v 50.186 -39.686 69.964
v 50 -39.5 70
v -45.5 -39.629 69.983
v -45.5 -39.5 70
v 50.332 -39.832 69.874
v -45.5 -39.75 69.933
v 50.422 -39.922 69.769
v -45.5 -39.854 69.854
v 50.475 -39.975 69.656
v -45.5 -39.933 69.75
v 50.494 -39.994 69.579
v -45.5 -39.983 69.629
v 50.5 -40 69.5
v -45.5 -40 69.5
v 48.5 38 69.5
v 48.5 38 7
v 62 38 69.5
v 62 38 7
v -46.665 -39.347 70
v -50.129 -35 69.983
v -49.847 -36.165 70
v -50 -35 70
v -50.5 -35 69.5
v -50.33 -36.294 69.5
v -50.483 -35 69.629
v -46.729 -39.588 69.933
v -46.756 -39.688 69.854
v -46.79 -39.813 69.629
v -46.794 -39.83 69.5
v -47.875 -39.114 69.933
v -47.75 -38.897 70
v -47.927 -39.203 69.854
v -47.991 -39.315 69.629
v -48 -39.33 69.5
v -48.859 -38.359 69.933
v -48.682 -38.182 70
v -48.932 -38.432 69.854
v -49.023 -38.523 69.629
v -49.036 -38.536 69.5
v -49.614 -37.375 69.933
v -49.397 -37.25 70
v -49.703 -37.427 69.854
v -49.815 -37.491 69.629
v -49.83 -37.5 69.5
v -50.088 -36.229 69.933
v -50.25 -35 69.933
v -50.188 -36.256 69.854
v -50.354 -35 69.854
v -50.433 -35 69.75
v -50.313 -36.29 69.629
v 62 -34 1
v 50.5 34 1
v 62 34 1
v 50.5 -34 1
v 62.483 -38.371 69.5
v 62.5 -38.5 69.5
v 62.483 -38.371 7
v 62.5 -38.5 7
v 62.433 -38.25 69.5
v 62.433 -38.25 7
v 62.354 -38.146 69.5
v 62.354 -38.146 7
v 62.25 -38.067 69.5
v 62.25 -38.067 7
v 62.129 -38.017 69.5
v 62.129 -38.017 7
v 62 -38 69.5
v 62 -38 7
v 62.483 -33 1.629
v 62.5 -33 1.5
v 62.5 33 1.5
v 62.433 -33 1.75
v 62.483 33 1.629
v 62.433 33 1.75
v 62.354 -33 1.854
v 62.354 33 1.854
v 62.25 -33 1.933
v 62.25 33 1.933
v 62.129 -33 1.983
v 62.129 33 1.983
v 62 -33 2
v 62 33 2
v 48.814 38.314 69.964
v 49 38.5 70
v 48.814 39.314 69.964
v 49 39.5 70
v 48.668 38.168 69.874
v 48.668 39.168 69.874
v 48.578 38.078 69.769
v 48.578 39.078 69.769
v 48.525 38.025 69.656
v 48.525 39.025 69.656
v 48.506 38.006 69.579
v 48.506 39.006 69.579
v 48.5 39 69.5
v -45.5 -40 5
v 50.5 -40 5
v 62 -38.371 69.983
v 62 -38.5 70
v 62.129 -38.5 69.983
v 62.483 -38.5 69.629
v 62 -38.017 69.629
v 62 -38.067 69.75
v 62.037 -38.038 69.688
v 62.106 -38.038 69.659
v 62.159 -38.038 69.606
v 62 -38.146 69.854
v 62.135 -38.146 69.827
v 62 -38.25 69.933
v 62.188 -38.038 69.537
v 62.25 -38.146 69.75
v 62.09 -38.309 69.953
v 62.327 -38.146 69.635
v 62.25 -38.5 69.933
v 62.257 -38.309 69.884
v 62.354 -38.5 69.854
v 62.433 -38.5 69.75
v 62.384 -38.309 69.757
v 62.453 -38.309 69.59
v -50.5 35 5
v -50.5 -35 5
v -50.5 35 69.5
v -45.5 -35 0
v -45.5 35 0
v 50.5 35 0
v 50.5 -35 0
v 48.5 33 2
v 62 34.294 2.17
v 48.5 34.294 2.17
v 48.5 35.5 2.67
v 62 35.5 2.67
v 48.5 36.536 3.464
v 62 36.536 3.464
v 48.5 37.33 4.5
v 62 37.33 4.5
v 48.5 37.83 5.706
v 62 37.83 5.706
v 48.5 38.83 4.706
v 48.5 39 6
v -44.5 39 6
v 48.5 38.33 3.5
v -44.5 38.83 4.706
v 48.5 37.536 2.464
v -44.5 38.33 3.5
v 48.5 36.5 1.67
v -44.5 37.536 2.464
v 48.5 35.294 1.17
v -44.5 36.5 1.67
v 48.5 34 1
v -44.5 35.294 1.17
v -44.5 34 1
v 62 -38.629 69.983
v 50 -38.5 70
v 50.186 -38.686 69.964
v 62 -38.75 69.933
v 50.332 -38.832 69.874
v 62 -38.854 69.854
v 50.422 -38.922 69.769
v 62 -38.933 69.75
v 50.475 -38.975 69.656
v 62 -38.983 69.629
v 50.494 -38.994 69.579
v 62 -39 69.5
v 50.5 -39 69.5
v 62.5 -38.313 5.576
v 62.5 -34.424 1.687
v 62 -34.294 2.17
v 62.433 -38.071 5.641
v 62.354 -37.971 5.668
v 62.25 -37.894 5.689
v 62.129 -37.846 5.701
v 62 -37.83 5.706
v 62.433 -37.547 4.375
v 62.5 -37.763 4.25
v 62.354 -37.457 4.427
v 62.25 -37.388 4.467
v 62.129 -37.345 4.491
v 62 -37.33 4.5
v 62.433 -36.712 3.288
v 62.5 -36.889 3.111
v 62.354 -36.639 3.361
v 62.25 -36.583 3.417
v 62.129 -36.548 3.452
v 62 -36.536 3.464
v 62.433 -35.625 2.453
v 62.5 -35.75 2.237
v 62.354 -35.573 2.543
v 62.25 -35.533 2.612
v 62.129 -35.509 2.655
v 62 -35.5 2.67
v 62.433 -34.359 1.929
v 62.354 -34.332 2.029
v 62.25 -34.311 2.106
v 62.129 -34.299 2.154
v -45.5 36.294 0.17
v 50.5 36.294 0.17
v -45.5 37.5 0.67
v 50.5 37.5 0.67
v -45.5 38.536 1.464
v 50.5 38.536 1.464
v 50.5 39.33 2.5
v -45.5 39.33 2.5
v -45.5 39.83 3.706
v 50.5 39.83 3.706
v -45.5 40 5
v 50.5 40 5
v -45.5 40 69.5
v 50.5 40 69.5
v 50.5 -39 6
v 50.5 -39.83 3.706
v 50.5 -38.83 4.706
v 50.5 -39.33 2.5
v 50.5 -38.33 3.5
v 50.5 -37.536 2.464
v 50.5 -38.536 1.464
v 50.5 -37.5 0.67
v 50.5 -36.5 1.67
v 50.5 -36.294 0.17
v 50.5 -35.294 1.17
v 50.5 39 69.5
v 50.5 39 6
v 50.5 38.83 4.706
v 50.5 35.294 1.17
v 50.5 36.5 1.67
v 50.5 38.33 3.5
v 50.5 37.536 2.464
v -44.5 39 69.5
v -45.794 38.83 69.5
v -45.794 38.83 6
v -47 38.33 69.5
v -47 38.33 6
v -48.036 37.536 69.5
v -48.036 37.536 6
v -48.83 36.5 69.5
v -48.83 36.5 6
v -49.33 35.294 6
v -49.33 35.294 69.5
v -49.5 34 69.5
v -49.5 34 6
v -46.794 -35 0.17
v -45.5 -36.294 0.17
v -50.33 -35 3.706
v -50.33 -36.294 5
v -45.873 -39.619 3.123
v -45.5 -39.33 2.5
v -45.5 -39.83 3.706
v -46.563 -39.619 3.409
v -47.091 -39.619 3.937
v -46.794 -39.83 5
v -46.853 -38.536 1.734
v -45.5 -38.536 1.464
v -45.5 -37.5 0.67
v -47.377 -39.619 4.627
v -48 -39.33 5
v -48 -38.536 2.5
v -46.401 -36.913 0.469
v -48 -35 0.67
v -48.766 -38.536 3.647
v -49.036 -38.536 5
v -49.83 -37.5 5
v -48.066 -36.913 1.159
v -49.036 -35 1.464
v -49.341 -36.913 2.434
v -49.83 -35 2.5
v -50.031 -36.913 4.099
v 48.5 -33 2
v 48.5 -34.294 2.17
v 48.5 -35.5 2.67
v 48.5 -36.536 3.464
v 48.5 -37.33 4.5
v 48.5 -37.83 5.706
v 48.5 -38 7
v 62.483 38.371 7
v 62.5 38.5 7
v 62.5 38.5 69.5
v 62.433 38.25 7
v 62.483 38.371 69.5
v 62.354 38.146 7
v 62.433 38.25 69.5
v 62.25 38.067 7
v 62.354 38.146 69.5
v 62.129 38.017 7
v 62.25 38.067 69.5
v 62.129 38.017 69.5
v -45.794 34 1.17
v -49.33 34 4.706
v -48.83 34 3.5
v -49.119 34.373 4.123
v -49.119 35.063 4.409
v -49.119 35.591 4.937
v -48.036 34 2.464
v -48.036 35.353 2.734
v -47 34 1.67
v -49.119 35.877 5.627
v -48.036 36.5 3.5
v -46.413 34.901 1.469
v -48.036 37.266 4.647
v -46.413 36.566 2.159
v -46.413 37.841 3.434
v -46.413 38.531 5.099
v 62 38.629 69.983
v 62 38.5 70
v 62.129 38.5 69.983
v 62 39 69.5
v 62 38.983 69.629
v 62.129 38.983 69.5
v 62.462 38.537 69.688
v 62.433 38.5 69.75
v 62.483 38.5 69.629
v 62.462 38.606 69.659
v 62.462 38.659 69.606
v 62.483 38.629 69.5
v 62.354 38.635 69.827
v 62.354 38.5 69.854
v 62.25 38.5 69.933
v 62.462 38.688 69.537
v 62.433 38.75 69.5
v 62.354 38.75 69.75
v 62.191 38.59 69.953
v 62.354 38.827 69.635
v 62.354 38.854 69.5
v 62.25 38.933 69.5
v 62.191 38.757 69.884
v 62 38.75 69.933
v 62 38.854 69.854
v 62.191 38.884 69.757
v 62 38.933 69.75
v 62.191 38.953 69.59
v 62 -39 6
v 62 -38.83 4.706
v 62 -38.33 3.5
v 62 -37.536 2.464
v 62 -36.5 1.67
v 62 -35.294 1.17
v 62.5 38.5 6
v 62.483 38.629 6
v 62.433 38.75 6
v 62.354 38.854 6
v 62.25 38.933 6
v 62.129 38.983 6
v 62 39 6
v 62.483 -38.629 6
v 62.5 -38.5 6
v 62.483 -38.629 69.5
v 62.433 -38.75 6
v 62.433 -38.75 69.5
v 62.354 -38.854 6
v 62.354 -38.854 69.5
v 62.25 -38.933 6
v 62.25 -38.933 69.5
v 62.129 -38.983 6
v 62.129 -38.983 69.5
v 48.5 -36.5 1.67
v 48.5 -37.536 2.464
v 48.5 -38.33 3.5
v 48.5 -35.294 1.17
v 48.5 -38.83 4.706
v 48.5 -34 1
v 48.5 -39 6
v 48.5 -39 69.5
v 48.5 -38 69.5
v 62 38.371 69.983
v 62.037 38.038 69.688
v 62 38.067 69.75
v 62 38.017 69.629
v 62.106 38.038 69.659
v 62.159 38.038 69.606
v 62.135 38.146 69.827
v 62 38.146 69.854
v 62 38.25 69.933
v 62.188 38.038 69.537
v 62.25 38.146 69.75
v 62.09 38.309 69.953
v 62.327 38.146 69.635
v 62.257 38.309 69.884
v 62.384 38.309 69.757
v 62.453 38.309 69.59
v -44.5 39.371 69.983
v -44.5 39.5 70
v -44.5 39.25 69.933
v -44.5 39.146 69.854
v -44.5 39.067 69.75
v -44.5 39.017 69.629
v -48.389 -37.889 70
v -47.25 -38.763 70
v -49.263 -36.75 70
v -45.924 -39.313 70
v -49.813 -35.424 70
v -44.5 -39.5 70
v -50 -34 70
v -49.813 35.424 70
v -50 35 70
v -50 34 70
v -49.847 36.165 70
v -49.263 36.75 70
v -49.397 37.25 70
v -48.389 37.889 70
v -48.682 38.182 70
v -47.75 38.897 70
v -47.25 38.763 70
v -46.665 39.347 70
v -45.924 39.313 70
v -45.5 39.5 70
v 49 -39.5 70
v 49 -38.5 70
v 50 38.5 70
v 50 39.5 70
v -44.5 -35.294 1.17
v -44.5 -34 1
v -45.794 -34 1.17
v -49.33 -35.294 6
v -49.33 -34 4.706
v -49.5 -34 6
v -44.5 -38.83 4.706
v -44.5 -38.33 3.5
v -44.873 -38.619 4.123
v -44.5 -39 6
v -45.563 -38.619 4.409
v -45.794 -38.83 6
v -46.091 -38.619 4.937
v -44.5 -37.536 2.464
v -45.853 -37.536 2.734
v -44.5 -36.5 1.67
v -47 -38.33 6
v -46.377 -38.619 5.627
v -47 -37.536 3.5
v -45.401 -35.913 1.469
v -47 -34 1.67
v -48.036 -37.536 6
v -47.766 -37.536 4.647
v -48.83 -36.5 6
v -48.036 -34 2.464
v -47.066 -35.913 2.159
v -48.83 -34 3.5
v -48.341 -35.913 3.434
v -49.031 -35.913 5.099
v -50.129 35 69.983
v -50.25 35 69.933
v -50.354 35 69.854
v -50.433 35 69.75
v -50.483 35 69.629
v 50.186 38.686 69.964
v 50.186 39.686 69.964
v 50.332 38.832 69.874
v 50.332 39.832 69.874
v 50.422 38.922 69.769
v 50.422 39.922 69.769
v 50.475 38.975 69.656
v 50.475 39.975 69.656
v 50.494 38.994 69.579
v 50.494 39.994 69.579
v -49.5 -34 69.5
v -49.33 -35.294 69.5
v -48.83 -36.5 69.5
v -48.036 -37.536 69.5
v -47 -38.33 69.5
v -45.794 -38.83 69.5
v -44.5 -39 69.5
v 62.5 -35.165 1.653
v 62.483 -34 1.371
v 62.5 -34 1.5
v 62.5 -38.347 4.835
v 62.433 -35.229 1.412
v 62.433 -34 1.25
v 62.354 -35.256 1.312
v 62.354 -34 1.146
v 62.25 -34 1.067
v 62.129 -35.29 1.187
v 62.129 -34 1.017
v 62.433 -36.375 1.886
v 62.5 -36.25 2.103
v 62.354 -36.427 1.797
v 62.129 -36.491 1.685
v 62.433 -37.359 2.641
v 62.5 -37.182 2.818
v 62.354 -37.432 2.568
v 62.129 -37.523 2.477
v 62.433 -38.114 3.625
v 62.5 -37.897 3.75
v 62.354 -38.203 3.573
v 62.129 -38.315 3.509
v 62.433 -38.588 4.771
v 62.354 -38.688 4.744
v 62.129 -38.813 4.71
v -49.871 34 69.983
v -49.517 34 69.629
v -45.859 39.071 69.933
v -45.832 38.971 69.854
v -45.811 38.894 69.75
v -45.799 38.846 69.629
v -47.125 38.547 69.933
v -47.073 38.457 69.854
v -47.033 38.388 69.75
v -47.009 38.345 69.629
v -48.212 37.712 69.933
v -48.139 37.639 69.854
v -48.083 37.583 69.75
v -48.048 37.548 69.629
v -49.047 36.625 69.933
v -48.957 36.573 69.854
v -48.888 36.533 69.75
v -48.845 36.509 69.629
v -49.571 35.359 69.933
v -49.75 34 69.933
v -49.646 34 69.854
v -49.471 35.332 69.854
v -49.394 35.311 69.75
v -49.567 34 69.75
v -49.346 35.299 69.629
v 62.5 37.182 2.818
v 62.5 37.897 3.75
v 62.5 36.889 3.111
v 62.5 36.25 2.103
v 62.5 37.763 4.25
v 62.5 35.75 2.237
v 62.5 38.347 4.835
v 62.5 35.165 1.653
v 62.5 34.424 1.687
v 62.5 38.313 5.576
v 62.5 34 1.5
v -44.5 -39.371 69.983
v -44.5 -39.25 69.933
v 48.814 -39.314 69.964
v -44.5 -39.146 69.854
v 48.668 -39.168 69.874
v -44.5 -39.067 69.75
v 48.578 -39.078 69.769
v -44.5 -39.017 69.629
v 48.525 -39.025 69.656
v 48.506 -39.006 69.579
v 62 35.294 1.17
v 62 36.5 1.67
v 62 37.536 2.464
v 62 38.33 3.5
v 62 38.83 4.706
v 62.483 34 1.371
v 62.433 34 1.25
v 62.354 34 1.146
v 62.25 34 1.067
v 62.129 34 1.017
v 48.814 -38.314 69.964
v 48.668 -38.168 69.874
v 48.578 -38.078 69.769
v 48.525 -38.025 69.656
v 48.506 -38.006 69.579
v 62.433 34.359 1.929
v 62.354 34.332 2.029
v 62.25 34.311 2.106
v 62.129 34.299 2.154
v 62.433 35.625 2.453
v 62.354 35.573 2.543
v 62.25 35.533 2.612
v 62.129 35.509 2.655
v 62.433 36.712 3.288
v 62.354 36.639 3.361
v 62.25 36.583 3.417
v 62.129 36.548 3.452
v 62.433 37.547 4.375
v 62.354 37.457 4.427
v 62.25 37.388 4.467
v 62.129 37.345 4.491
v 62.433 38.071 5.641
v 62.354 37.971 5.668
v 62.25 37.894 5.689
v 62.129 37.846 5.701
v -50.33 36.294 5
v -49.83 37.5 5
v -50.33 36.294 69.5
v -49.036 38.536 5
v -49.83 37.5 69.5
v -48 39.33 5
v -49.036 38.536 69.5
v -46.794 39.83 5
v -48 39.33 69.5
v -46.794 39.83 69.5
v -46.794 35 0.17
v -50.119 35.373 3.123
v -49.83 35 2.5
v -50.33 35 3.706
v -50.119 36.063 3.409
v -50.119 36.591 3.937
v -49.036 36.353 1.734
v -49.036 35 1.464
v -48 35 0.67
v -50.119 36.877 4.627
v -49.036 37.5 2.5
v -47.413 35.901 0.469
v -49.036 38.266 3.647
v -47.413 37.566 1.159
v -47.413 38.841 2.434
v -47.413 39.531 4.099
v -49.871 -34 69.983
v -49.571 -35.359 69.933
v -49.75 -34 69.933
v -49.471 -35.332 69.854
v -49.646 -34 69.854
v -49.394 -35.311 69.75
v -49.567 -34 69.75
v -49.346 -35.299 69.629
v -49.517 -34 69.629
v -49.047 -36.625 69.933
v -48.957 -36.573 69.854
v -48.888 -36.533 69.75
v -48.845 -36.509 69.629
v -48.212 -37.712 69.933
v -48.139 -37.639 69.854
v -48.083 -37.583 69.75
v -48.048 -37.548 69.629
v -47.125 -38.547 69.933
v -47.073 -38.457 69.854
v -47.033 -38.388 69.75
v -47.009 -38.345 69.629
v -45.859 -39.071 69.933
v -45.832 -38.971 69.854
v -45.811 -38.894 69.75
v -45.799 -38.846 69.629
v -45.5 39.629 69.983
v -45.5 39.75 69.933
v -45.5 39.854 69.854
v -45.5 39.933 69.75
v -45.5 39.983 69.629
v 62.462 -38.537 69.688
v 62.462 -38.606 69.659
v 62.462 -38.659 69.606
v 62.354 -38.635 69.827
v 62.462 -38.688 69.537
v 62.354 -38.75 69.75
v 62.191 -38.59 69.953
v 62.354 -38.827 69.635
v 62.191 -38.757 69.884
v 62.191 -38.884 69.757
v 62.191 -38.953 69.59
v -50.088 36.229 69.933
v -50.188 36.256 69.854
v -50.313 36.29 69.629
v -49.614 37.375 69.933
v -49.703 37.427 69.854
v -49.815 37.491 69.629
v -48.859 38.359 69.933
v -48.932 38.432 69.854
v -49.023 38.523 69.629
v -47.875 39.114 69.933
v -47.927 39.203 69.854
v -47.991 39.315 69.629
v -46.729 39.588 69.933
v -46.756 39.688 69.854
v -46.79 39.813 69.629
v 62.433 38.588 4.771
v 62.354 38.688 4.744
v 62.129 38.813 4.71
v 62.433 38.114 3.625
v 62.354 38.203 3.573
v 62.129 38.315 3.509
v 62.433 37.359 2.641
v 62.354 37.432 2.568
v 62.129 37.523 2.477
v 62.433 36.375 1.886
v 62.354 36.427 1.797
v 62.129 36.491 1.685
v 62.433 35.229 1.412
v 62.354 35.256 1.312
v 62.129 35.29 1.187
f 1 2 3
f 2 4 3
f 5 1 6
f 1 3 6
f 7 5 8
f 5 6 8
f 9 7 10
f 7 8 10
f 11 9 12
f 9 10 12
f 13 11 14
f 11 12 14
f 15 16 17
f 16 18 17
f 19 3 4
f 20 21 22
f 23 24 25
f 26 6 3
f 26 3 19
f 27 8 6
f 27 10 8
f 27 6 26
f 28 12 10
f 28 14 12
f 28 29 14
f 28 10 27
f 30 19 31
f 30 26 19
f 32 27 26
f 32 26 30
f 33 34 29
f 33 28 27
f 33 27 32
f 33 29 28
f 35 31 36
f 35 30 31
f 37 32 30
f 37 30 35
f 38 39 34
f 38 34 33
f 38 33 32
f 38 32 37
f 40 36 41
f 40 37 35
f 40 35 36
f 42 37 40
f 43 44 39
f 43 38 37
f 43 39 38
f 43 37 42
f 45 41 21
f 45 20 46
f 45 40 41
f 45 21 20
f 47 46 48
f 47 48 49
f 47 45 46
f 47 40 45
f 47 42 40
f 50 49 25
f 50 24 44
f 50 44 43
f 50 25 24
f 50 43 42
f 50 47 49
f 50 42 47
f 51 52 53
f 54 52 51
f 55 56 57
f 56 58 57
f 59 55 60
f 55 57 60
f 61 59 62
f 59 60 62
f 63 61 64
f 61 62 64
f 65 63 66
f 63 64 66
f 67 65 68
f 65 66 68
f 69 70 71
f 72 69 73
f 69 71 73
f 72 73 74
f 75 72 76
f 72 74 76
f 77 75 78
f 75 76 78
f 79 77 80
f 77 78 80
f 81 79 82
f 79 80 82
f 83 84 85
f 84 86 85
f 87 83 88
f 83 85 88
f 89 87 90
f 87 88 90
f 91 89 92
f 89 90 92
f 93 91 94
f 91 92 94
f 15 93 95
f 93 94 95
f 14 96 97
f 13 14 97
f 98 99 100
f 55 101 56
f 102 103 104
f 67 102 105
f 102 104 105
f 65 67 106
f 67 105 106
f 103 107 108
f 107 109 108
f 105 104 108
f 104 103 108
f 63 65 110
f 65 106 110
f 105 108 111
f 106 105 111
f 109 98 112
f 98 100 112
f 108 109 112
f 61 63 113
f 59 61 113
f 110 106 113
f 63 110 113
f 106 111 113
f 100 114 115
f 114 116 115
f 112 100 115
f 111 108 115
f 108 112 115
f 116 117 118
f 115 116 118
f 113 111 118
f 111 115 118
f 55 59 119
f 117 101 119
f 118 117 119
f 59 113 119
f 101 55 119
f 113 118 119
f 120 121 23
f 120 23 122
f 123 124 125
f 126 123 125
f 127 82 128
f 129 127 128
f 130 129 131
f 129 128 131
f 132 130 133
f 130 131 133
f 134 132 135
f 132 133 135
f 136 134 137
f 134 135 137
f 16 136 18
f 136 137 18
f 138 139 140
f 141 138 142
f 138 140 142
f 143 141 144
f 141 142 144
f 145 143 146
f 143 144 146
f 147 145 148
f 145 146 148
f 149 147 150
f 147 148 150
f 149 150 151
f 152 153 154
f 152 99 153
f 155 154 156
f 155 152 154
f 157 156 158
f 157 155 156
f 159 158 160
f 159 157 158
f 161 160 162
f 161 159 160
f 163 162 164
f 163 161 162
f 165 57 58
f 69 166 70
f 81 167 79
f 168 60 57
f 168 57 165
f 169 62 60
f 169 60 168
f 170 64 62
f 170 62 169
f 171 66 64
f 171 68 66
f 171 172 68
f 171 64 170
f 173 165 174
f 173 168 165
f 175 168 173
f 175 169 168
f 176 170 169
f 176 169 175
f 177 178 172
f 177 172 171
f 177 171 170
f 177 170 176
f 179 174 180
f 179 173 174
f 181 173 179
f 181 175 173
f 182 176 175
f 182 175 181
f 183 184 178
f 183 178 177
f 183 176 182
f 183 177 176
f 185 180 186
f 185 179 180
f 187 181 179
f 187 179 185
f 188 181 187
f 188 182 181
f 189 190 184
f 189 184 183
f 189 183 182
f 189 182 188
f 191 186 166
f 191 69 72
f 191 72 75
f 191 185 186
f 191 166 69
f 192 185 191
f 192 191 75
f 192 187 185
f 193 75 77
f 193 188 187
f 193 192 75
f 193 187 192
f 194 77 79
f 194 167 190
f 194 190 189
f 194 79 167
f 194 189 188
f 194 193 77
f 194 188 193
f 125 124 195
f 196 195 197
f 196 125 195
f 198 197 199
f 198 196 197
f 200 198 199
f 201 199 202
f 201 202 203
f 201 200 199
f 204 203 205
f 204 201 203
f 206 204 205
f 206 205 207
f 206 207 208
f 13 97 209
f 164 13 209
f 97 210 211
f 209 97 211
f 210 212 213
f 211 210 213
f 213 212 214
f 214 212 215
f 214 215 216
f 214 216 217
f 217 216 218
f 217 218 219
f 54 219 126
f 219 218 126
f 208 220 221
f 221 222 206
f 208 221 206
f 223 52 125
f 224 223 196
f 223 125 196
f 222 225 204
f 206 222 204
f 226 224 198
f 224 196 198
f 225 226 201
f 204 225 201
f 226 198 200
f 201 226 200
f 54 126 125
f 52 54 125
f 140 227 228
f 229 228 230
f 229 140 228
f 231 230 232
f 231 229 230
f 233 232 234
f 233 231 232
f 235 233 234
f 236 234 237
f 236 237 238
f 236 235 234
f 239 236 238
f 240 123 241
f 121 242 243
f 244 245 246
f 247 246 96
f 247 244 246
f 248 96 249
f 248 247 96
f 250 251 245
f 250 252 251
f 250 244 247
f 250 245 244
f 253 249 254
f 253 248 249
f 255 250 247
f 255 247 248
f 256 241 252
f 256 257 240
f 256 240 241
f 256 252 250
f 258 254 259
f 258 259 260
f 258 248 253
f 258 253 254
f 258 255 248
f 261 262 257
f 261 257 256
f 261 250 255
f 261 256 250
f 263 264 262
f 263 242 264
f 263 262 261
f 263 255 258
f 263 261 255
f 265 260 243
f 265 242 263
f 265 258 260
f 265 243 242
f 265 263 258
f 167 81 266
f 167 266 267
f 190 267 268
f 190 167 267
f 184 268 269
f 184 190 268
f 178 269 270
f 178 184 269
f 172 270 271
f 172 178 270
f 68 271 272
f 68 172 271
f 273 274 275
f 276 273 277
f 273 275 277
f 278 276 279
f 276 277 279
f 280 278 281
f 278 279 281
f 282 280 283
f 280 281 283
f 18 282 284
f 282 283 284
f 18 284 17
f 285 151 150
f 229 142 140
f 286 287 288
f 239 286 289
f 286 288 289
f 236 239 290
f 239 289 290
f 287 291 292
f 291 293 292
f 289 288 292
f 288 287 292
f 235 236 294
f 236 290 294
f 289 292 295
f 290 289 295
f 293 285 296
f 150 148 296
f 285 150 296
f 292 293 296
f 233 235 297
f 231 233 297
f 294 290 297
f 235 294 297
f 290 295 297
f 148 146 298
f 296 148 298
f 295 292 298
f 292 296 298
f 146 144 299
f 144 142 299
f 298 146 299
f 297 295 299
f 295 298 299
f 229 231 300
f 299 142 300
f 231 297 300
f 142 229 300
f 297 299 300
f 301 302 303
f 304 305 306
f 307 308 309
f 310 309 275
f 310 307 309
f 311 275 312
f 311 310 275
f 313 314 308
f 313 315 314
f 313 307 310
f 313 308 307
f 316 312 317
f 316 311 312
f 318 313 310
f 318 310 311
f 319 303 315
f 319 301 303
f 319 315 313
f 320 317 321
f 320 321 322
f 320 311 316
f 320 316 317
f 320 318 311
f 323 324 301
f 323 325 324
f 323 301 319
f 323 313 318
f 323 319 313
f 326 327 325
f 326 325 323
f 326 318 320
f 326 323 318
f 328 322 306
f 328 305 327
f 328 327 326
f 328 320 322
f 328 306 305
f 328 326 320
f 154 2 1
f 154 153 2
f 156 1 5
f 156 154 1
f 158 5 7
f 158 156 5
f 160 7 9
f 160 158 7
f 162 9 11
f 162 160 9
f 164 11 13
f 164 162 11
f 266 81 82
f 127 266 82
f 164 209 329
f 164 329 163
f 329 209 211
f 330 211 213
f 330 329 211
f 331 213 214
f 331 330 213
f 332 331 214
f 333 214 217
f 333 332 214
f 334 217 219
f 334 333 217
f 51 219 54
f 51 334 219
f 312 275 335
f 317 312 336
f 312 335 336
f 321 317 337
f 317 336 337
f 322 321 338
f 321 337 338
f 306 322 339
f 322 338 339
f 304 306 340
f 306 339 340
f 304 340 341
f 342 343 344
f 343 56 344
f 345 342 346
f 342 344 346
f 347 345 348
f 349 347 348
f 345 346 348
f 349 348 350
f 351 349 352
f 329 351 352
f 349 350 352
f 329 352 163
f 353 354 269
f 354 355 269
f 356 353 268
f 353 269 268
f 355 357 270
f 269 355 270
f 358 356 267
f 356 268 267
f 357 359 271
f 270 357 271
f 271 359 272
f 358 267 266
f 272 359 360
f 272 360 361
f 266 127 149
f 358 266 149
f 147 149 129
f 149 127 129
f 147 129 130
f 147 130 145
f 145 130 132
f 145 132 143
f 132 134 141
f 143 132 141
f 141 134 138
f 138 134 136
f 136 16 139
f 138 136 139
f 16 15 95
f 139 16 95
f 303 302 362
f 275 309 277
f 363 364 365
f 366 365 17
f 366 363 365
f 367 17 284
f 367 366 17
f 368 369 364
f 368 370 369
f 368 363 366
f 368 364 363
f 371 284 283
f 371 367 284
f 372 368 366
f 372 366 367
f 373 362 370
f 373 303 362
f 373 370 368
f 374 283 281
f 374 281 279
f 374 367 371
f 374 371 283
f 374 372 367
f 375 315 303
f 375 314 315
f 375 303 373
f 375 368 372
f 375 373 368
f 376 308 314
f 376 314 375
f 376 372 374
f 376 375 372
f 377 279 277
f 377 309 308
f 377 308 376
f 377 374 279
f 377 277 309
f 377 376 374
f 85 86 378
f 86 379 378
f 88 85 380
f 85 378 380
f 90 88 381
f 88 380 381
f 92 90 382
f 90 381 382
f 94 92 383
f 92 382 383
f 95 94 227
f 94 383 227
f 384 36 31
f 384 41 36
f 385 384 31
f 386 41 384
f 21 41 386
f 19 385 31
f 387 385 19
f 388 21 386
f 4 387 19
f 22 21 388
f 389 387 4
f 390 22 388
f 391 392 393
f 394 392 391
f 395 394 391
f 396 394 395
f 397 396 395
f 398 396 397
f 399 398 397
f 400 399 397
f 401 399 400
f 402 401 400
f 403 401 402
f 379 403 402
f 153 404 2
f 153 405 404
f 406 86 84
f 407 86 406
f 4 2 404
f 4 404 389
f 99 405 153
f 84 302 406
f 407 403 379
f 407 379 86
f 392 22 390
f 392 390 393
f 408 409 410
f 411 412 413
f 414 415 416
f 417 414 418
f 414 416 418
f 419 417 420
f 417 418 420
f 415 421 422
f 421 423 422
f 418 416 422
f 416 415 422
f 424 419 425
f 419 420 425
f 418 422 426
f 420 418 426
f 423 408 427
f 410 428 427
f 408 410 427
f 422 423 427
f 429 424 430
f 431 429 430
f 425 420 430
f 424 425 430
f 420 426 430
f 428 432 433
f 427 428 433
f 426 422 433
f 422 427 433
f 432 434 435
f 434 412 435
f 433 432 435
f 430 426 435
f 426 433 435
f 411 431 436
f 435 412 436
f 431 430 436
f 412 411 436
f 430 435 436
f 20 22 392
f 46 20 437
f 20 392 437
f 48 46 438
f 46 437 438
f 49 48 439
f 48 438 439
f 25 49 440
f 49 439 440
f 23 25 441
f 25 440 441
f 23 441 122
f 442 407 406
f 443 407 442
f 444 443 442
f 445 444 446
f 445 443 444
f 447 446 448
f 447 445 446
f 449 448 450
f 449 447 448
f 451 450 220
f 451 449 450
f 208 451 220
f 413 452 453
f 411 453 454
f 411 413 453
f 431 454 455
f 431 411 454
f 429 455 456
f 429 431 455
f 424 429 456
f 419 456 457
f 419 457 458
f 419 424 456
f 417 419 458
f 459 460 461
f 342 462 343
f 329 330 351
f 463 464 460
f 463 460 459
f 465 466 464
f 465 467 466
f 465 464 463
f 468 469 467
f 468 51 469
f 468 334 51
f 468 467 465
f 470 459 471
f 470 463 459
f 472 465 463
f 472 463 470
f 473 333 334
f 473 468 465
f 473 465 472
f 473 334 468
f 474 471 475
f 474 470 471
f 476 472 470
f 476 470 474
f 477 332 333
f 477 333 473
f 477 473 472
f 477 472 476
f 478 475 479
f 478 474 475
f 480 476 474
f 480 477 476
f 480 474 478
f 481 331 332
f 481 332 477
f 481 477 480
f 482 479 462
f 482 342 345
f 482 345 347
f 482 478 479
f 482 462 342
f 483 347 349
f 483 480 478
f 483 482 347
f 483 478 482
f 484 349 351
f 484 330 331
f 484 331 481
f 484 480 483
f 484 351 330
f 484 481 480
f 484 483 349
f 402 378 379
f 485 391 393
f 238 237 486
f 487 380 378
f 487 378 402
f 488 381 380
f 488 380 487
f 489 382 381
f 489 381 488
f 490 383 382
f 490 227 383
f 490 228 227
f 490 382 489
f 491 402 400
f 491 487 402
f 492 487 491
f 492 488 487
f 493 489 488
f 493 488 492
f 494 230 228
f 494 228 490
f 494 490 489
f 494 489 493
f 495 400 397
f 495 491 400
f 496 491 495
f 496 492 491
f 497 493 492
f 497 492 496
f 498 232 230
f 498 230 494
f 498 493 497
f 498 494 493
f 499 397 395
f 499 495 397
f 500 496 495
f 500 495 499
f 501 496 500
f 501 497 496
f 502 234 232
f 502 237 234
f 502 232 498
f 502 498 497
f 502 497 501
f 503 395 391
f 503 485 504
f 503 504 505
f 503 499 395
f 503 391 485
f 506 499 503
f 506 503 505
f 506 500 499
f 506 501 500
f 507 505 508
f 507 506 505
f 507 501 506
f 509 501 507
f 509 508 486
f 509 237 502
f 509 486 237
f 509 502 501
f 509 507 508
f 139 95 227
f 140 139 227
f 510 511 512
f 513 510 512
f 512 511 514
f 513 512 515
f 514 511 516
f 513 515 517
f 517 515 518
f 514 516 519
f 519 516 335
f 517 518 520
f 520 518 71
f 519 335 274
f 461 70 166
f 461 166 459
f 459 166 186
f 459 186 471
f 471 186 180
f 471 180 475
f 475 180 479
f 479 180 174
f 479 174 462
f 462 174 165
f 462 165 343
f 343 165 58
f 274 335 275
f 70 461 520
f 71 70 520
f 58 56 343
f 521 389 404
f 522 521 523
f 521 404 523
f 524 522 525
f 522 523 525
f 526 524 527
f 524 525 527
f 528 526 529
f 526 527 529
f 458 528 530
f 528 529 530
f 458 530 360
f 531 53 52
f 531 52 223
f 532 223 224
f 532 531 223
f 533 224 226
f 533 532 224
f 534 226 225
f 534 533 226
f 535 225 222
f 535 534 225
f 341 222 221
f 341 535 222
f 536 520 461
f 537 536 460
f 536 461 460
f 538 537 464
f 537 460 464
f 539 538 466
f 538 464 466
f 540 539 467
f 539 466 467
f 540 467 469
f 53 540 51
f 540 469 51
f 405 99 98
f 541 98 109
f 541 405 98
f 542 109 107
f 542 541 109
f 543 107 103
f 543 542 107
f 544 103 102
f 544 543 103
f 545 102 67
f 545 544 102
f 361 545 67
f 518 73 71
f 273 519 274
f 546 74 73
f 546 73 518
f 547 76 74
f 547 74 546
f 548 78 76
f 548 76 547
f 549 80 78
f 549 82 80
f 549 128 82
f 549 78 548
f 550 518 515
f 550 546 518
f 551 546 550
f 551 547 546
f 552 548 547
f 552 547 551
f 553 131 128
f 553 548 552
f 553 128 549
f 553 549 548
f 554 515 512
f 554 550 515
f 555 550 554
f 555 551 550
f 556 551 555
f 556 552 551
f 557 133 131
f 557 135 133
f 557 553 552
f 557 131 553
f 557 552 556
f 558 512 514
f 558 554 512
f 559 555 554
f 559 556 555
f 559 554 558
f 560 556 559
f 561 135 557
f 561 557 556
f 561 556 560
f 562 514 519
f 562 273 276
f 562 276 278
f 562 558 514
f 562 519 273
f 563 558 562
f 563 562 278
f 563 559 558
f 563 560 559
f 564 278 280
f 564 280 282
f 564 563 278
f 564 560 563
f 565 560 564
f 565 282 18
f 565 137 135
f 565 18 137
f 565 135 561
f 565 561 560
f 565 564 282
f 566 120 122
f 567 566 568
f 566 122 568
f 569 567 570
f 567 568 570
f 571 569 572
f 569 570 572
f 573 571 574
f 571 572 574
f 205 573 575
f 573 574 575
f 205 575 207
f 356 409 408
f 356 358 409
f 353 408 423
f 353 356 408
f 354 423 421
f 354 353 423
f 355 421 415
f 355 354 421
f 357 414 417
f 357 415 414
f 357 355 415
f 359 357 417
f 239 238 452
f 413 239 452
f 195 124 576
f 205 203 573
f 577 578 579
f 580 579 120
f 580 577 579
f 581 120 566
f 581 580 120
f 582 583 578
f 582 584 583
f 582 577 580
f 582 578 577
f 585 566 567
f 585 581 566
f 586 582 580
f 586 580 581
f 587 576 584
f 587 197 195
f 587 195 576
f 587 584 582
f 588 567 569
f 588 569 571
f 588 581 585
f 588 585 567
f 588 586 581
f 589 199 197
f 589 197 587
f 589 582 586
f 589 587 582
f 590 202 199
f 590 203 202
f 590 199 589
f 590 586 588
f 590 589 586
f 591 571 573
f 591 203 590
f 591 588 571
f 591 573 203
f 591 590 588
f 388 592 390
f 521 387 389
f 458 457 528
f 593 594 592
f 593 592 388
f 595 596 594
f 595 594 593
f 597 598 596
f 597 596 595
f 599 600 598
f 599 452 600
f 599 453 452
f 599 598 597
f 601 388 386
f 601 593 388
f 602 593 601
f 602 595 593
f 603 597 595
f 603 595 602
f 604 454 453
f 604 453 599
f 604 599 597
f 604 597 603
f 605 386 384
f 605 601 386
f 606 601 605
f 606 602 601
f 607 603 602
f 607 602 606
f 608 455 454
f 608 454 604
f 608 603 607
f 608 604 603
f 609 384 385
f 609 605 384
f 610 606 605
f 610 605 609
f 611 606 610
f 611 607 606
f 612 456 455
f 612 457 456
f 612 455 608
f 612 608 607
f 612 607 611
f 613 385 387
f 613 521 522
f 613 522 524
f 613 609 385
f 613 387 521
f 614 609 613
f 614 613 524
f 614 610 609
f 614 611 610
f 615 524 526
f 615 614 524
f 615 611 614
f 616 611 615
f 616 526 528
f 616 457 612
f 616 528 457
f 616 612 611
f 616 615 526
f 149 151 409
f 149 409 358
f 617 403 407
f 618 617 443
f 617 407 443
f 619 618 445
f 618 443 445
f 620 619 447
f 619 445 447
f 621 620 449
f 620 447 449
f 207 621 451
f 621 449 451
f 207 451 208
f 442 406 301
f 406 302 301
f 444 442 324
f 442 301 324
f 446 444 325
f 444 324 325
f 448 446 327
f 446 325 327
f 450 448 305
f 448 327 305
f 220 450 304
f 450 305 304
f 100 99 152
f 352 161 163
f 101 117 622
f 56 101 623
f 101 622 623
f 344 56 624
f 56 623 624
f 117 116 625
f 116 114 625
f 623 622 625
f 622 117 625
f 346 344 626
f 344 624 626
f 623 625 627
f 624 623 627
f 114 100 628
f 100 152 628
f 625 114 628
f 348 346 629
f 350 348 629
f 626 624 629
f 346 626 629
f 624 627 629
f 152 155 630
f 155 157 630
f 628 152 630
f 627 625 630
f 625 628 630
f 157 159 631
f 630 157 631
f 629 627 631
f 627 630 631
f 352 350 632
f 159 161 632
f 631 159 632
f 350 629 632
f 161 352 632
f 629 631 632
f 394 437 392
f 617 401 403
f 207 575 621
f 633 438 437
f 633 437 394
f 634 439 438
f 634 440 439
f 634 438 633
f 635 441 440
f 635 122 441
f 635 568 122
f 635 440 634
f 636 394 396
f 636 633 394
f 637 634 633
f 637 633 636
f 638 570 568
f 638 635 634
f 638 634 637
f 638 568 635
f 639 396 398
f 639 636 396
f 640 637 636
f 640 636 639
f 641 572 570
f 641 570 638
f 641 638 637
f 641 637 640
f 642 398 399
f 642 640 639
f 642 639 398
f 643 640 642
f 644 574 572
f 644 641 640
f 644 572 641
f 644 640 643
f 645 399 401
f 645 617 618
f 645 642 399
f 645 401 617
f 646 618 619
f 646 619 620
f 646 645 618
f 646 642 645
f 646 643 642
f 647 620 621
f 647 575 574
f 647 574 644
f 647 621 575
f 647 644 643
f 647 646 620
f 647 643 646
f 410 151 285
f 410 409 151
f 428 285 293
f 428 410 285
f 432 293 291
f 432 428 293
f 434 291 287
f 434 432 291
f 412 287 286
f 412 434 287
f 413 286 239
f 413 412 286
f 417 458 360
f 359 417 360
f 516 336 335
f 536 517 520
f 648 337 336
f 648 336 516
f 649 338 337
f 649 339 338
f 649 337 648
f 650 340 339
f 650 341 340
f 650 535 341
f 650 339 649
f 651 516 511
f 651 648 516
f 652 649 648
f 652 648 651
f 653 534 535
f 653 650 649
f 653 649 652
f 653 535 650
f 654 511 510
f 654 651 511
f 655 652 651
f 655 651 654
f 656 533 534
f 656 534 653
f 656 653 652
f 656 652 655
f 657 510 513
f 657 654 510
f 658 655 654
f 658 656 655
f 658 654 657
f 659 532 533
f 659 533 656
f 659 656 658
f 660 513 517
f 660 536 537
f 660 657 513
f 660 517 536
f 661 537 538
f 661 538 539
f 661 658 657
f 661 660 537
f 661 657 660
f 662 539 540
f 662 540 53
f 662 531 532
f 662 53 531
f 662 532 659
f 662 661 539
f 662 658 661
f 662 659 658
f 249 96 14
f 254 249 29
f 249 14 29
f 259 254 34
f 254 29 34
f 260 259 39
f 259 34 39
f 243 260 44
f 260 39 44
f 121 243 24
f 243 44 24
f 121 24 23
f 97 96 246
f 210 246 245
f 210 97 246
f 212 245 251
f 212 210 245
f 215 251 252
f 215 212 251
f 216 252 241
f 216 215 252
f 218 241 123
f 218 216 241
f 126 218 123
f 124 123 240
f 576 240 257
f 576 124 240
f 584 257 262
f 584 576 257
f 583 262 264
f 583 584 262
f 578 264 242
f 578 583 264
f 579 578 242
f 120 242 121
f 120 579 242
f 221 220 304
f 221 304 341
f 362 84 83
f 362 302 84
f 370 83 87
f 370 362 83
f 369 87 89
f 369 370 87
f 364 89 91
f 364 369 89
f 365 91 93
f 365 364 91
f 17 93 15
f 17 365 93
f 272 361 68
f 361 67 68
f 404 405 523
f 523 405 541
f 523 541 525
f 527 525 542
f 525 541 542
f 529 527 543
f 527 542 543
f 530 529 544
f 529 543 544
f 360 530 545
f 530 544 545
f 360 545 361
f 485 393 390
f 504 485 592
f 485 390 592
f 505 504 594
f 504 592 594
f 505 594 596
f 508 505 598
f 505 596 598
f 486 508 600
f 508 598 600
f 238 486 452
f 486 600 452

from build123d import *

# Parameters (mm, degrees)
F0_W     = 101
F0_H     = 80
F1_DEPTH = 70
F3_DEPTH = 69
F5_DEPTH = 2
F7_DEPTH = 14
F8_R     = 5
F9_R     = 0.49999


# Not quite as in the source:
# - a fillet or chamfer is up to 0.001 mm smaller than in the source, because OpenCascade refuses the exact size


with BuildPart() as f1:
    # F0 (on Top) → F1 (new body)
    with BuildSketch(Plane.XY):
        Rectangle(F0_W, F0_H)
    extrude(amount=F1_DEPTH)

    # F2 (on face) → F3 (cut)
    with BuildSketch(Plane.XY.offset(70)):
        Polygon((48.5, 39), (-49.5, 39), (-49.5, 20.586034283), (-49.5, -39), (48.5, -39), (48.5, -30.7030728576), align=None)
    extrude(amount=-F3_DEPTH, mode=Mode.SUBTRACT)

    # F4 (on face) → F5 (cut)
    with BuildSketch(Plane.YZ.offset(50.5)):
        Polygon((38, 2), (38, 70), (-38, 70), (-38, 42.2970801592), (-38, 2), align=None)
    extrude(amount=-F5_DEPTH, mode=Mode.SUBTRACT)

    # F6 (on face) → F7 (join)
    with BuildSketch(Plane(origin=(48.5, 0, 0), x_dir=(0, -1, 0), z_dir=(-1, 0, 0))):
        Polygon((39, 1), (39, 70), (38, 70), (38, 2), (-38, 2), (-38, 70), (-39, 70), (-39, 1), align=None)
    extrude(amount=-F7_DEPTH)

    # F8
    f8_edges = [f1.edges().sort_by_distance(p)[0] for p in [
        (-0.5, 39, 1),
        (-49.5, 0, 1),
        (-0.5, -39, 1),
        (0, 40, 0),
        (-50.5, 0, 0),
        (0, -40, 0),
        (-50.5, -40, 35),
        (-50.5, 40, 35),
        (-49.5, 39, 35.5),
        (-49.5, -39, 35.5),
        (56.5, 39, 1),
        (56.5, -39, 1),
        (55.5, -38, 2),
        (55.5, 38, 2),
    ]]
    fillet(f8_edges, radius=F8_R)

    # F9 (radius 0.5 in the source; OpenCascade refuses exactly that, so slightly less here)
    f9_edges = [f1.edges().sort_by_distance(p)[0] for p in [
        (2.5, 40, 70),
        (-49.035534, 38.535534, 70),
        (50.5, 39.5, 70),
        (-50.5, 0, 70),
        (56.5, 39, 70),
        (-49.035534, -38.535534, 70),
        (62.5, 38.5, 70),
        (2.5, -40, 70),
        (55.5, 38, 70),
        (50.5, -39.5, 70),
        (48.5, 38.5, 70),
        (56.5, -39, 70),
        (2, 39, 70),
        (62.5, -38.5, 70),
        (-48.035534, 37.535534, 70),
        (55.5, -38, 70),
        (-49.5, 0, 70),
        (48.5, -38.5, 70),
        (-48.035534, -37.535534, 70),
        (2, -39, 70),
        (62.5, -39, 38),
        (62.5, -37.535534, 2.464466),
        (62.5, 0, 1),
        (62.5, -38, 38.5),
        (62.5, 37.535534, 2.464466),
        (62.5, -36.535534, 3.464466),
        (62.5, 39, 38),
        (62.5, 0, 2),
        (62.5, 36.535534, 3.464466),
        (62.5, 38, 38.5),
    ]]
    fillet(f9_edges, radius=F9_R)


solid = f1.part
